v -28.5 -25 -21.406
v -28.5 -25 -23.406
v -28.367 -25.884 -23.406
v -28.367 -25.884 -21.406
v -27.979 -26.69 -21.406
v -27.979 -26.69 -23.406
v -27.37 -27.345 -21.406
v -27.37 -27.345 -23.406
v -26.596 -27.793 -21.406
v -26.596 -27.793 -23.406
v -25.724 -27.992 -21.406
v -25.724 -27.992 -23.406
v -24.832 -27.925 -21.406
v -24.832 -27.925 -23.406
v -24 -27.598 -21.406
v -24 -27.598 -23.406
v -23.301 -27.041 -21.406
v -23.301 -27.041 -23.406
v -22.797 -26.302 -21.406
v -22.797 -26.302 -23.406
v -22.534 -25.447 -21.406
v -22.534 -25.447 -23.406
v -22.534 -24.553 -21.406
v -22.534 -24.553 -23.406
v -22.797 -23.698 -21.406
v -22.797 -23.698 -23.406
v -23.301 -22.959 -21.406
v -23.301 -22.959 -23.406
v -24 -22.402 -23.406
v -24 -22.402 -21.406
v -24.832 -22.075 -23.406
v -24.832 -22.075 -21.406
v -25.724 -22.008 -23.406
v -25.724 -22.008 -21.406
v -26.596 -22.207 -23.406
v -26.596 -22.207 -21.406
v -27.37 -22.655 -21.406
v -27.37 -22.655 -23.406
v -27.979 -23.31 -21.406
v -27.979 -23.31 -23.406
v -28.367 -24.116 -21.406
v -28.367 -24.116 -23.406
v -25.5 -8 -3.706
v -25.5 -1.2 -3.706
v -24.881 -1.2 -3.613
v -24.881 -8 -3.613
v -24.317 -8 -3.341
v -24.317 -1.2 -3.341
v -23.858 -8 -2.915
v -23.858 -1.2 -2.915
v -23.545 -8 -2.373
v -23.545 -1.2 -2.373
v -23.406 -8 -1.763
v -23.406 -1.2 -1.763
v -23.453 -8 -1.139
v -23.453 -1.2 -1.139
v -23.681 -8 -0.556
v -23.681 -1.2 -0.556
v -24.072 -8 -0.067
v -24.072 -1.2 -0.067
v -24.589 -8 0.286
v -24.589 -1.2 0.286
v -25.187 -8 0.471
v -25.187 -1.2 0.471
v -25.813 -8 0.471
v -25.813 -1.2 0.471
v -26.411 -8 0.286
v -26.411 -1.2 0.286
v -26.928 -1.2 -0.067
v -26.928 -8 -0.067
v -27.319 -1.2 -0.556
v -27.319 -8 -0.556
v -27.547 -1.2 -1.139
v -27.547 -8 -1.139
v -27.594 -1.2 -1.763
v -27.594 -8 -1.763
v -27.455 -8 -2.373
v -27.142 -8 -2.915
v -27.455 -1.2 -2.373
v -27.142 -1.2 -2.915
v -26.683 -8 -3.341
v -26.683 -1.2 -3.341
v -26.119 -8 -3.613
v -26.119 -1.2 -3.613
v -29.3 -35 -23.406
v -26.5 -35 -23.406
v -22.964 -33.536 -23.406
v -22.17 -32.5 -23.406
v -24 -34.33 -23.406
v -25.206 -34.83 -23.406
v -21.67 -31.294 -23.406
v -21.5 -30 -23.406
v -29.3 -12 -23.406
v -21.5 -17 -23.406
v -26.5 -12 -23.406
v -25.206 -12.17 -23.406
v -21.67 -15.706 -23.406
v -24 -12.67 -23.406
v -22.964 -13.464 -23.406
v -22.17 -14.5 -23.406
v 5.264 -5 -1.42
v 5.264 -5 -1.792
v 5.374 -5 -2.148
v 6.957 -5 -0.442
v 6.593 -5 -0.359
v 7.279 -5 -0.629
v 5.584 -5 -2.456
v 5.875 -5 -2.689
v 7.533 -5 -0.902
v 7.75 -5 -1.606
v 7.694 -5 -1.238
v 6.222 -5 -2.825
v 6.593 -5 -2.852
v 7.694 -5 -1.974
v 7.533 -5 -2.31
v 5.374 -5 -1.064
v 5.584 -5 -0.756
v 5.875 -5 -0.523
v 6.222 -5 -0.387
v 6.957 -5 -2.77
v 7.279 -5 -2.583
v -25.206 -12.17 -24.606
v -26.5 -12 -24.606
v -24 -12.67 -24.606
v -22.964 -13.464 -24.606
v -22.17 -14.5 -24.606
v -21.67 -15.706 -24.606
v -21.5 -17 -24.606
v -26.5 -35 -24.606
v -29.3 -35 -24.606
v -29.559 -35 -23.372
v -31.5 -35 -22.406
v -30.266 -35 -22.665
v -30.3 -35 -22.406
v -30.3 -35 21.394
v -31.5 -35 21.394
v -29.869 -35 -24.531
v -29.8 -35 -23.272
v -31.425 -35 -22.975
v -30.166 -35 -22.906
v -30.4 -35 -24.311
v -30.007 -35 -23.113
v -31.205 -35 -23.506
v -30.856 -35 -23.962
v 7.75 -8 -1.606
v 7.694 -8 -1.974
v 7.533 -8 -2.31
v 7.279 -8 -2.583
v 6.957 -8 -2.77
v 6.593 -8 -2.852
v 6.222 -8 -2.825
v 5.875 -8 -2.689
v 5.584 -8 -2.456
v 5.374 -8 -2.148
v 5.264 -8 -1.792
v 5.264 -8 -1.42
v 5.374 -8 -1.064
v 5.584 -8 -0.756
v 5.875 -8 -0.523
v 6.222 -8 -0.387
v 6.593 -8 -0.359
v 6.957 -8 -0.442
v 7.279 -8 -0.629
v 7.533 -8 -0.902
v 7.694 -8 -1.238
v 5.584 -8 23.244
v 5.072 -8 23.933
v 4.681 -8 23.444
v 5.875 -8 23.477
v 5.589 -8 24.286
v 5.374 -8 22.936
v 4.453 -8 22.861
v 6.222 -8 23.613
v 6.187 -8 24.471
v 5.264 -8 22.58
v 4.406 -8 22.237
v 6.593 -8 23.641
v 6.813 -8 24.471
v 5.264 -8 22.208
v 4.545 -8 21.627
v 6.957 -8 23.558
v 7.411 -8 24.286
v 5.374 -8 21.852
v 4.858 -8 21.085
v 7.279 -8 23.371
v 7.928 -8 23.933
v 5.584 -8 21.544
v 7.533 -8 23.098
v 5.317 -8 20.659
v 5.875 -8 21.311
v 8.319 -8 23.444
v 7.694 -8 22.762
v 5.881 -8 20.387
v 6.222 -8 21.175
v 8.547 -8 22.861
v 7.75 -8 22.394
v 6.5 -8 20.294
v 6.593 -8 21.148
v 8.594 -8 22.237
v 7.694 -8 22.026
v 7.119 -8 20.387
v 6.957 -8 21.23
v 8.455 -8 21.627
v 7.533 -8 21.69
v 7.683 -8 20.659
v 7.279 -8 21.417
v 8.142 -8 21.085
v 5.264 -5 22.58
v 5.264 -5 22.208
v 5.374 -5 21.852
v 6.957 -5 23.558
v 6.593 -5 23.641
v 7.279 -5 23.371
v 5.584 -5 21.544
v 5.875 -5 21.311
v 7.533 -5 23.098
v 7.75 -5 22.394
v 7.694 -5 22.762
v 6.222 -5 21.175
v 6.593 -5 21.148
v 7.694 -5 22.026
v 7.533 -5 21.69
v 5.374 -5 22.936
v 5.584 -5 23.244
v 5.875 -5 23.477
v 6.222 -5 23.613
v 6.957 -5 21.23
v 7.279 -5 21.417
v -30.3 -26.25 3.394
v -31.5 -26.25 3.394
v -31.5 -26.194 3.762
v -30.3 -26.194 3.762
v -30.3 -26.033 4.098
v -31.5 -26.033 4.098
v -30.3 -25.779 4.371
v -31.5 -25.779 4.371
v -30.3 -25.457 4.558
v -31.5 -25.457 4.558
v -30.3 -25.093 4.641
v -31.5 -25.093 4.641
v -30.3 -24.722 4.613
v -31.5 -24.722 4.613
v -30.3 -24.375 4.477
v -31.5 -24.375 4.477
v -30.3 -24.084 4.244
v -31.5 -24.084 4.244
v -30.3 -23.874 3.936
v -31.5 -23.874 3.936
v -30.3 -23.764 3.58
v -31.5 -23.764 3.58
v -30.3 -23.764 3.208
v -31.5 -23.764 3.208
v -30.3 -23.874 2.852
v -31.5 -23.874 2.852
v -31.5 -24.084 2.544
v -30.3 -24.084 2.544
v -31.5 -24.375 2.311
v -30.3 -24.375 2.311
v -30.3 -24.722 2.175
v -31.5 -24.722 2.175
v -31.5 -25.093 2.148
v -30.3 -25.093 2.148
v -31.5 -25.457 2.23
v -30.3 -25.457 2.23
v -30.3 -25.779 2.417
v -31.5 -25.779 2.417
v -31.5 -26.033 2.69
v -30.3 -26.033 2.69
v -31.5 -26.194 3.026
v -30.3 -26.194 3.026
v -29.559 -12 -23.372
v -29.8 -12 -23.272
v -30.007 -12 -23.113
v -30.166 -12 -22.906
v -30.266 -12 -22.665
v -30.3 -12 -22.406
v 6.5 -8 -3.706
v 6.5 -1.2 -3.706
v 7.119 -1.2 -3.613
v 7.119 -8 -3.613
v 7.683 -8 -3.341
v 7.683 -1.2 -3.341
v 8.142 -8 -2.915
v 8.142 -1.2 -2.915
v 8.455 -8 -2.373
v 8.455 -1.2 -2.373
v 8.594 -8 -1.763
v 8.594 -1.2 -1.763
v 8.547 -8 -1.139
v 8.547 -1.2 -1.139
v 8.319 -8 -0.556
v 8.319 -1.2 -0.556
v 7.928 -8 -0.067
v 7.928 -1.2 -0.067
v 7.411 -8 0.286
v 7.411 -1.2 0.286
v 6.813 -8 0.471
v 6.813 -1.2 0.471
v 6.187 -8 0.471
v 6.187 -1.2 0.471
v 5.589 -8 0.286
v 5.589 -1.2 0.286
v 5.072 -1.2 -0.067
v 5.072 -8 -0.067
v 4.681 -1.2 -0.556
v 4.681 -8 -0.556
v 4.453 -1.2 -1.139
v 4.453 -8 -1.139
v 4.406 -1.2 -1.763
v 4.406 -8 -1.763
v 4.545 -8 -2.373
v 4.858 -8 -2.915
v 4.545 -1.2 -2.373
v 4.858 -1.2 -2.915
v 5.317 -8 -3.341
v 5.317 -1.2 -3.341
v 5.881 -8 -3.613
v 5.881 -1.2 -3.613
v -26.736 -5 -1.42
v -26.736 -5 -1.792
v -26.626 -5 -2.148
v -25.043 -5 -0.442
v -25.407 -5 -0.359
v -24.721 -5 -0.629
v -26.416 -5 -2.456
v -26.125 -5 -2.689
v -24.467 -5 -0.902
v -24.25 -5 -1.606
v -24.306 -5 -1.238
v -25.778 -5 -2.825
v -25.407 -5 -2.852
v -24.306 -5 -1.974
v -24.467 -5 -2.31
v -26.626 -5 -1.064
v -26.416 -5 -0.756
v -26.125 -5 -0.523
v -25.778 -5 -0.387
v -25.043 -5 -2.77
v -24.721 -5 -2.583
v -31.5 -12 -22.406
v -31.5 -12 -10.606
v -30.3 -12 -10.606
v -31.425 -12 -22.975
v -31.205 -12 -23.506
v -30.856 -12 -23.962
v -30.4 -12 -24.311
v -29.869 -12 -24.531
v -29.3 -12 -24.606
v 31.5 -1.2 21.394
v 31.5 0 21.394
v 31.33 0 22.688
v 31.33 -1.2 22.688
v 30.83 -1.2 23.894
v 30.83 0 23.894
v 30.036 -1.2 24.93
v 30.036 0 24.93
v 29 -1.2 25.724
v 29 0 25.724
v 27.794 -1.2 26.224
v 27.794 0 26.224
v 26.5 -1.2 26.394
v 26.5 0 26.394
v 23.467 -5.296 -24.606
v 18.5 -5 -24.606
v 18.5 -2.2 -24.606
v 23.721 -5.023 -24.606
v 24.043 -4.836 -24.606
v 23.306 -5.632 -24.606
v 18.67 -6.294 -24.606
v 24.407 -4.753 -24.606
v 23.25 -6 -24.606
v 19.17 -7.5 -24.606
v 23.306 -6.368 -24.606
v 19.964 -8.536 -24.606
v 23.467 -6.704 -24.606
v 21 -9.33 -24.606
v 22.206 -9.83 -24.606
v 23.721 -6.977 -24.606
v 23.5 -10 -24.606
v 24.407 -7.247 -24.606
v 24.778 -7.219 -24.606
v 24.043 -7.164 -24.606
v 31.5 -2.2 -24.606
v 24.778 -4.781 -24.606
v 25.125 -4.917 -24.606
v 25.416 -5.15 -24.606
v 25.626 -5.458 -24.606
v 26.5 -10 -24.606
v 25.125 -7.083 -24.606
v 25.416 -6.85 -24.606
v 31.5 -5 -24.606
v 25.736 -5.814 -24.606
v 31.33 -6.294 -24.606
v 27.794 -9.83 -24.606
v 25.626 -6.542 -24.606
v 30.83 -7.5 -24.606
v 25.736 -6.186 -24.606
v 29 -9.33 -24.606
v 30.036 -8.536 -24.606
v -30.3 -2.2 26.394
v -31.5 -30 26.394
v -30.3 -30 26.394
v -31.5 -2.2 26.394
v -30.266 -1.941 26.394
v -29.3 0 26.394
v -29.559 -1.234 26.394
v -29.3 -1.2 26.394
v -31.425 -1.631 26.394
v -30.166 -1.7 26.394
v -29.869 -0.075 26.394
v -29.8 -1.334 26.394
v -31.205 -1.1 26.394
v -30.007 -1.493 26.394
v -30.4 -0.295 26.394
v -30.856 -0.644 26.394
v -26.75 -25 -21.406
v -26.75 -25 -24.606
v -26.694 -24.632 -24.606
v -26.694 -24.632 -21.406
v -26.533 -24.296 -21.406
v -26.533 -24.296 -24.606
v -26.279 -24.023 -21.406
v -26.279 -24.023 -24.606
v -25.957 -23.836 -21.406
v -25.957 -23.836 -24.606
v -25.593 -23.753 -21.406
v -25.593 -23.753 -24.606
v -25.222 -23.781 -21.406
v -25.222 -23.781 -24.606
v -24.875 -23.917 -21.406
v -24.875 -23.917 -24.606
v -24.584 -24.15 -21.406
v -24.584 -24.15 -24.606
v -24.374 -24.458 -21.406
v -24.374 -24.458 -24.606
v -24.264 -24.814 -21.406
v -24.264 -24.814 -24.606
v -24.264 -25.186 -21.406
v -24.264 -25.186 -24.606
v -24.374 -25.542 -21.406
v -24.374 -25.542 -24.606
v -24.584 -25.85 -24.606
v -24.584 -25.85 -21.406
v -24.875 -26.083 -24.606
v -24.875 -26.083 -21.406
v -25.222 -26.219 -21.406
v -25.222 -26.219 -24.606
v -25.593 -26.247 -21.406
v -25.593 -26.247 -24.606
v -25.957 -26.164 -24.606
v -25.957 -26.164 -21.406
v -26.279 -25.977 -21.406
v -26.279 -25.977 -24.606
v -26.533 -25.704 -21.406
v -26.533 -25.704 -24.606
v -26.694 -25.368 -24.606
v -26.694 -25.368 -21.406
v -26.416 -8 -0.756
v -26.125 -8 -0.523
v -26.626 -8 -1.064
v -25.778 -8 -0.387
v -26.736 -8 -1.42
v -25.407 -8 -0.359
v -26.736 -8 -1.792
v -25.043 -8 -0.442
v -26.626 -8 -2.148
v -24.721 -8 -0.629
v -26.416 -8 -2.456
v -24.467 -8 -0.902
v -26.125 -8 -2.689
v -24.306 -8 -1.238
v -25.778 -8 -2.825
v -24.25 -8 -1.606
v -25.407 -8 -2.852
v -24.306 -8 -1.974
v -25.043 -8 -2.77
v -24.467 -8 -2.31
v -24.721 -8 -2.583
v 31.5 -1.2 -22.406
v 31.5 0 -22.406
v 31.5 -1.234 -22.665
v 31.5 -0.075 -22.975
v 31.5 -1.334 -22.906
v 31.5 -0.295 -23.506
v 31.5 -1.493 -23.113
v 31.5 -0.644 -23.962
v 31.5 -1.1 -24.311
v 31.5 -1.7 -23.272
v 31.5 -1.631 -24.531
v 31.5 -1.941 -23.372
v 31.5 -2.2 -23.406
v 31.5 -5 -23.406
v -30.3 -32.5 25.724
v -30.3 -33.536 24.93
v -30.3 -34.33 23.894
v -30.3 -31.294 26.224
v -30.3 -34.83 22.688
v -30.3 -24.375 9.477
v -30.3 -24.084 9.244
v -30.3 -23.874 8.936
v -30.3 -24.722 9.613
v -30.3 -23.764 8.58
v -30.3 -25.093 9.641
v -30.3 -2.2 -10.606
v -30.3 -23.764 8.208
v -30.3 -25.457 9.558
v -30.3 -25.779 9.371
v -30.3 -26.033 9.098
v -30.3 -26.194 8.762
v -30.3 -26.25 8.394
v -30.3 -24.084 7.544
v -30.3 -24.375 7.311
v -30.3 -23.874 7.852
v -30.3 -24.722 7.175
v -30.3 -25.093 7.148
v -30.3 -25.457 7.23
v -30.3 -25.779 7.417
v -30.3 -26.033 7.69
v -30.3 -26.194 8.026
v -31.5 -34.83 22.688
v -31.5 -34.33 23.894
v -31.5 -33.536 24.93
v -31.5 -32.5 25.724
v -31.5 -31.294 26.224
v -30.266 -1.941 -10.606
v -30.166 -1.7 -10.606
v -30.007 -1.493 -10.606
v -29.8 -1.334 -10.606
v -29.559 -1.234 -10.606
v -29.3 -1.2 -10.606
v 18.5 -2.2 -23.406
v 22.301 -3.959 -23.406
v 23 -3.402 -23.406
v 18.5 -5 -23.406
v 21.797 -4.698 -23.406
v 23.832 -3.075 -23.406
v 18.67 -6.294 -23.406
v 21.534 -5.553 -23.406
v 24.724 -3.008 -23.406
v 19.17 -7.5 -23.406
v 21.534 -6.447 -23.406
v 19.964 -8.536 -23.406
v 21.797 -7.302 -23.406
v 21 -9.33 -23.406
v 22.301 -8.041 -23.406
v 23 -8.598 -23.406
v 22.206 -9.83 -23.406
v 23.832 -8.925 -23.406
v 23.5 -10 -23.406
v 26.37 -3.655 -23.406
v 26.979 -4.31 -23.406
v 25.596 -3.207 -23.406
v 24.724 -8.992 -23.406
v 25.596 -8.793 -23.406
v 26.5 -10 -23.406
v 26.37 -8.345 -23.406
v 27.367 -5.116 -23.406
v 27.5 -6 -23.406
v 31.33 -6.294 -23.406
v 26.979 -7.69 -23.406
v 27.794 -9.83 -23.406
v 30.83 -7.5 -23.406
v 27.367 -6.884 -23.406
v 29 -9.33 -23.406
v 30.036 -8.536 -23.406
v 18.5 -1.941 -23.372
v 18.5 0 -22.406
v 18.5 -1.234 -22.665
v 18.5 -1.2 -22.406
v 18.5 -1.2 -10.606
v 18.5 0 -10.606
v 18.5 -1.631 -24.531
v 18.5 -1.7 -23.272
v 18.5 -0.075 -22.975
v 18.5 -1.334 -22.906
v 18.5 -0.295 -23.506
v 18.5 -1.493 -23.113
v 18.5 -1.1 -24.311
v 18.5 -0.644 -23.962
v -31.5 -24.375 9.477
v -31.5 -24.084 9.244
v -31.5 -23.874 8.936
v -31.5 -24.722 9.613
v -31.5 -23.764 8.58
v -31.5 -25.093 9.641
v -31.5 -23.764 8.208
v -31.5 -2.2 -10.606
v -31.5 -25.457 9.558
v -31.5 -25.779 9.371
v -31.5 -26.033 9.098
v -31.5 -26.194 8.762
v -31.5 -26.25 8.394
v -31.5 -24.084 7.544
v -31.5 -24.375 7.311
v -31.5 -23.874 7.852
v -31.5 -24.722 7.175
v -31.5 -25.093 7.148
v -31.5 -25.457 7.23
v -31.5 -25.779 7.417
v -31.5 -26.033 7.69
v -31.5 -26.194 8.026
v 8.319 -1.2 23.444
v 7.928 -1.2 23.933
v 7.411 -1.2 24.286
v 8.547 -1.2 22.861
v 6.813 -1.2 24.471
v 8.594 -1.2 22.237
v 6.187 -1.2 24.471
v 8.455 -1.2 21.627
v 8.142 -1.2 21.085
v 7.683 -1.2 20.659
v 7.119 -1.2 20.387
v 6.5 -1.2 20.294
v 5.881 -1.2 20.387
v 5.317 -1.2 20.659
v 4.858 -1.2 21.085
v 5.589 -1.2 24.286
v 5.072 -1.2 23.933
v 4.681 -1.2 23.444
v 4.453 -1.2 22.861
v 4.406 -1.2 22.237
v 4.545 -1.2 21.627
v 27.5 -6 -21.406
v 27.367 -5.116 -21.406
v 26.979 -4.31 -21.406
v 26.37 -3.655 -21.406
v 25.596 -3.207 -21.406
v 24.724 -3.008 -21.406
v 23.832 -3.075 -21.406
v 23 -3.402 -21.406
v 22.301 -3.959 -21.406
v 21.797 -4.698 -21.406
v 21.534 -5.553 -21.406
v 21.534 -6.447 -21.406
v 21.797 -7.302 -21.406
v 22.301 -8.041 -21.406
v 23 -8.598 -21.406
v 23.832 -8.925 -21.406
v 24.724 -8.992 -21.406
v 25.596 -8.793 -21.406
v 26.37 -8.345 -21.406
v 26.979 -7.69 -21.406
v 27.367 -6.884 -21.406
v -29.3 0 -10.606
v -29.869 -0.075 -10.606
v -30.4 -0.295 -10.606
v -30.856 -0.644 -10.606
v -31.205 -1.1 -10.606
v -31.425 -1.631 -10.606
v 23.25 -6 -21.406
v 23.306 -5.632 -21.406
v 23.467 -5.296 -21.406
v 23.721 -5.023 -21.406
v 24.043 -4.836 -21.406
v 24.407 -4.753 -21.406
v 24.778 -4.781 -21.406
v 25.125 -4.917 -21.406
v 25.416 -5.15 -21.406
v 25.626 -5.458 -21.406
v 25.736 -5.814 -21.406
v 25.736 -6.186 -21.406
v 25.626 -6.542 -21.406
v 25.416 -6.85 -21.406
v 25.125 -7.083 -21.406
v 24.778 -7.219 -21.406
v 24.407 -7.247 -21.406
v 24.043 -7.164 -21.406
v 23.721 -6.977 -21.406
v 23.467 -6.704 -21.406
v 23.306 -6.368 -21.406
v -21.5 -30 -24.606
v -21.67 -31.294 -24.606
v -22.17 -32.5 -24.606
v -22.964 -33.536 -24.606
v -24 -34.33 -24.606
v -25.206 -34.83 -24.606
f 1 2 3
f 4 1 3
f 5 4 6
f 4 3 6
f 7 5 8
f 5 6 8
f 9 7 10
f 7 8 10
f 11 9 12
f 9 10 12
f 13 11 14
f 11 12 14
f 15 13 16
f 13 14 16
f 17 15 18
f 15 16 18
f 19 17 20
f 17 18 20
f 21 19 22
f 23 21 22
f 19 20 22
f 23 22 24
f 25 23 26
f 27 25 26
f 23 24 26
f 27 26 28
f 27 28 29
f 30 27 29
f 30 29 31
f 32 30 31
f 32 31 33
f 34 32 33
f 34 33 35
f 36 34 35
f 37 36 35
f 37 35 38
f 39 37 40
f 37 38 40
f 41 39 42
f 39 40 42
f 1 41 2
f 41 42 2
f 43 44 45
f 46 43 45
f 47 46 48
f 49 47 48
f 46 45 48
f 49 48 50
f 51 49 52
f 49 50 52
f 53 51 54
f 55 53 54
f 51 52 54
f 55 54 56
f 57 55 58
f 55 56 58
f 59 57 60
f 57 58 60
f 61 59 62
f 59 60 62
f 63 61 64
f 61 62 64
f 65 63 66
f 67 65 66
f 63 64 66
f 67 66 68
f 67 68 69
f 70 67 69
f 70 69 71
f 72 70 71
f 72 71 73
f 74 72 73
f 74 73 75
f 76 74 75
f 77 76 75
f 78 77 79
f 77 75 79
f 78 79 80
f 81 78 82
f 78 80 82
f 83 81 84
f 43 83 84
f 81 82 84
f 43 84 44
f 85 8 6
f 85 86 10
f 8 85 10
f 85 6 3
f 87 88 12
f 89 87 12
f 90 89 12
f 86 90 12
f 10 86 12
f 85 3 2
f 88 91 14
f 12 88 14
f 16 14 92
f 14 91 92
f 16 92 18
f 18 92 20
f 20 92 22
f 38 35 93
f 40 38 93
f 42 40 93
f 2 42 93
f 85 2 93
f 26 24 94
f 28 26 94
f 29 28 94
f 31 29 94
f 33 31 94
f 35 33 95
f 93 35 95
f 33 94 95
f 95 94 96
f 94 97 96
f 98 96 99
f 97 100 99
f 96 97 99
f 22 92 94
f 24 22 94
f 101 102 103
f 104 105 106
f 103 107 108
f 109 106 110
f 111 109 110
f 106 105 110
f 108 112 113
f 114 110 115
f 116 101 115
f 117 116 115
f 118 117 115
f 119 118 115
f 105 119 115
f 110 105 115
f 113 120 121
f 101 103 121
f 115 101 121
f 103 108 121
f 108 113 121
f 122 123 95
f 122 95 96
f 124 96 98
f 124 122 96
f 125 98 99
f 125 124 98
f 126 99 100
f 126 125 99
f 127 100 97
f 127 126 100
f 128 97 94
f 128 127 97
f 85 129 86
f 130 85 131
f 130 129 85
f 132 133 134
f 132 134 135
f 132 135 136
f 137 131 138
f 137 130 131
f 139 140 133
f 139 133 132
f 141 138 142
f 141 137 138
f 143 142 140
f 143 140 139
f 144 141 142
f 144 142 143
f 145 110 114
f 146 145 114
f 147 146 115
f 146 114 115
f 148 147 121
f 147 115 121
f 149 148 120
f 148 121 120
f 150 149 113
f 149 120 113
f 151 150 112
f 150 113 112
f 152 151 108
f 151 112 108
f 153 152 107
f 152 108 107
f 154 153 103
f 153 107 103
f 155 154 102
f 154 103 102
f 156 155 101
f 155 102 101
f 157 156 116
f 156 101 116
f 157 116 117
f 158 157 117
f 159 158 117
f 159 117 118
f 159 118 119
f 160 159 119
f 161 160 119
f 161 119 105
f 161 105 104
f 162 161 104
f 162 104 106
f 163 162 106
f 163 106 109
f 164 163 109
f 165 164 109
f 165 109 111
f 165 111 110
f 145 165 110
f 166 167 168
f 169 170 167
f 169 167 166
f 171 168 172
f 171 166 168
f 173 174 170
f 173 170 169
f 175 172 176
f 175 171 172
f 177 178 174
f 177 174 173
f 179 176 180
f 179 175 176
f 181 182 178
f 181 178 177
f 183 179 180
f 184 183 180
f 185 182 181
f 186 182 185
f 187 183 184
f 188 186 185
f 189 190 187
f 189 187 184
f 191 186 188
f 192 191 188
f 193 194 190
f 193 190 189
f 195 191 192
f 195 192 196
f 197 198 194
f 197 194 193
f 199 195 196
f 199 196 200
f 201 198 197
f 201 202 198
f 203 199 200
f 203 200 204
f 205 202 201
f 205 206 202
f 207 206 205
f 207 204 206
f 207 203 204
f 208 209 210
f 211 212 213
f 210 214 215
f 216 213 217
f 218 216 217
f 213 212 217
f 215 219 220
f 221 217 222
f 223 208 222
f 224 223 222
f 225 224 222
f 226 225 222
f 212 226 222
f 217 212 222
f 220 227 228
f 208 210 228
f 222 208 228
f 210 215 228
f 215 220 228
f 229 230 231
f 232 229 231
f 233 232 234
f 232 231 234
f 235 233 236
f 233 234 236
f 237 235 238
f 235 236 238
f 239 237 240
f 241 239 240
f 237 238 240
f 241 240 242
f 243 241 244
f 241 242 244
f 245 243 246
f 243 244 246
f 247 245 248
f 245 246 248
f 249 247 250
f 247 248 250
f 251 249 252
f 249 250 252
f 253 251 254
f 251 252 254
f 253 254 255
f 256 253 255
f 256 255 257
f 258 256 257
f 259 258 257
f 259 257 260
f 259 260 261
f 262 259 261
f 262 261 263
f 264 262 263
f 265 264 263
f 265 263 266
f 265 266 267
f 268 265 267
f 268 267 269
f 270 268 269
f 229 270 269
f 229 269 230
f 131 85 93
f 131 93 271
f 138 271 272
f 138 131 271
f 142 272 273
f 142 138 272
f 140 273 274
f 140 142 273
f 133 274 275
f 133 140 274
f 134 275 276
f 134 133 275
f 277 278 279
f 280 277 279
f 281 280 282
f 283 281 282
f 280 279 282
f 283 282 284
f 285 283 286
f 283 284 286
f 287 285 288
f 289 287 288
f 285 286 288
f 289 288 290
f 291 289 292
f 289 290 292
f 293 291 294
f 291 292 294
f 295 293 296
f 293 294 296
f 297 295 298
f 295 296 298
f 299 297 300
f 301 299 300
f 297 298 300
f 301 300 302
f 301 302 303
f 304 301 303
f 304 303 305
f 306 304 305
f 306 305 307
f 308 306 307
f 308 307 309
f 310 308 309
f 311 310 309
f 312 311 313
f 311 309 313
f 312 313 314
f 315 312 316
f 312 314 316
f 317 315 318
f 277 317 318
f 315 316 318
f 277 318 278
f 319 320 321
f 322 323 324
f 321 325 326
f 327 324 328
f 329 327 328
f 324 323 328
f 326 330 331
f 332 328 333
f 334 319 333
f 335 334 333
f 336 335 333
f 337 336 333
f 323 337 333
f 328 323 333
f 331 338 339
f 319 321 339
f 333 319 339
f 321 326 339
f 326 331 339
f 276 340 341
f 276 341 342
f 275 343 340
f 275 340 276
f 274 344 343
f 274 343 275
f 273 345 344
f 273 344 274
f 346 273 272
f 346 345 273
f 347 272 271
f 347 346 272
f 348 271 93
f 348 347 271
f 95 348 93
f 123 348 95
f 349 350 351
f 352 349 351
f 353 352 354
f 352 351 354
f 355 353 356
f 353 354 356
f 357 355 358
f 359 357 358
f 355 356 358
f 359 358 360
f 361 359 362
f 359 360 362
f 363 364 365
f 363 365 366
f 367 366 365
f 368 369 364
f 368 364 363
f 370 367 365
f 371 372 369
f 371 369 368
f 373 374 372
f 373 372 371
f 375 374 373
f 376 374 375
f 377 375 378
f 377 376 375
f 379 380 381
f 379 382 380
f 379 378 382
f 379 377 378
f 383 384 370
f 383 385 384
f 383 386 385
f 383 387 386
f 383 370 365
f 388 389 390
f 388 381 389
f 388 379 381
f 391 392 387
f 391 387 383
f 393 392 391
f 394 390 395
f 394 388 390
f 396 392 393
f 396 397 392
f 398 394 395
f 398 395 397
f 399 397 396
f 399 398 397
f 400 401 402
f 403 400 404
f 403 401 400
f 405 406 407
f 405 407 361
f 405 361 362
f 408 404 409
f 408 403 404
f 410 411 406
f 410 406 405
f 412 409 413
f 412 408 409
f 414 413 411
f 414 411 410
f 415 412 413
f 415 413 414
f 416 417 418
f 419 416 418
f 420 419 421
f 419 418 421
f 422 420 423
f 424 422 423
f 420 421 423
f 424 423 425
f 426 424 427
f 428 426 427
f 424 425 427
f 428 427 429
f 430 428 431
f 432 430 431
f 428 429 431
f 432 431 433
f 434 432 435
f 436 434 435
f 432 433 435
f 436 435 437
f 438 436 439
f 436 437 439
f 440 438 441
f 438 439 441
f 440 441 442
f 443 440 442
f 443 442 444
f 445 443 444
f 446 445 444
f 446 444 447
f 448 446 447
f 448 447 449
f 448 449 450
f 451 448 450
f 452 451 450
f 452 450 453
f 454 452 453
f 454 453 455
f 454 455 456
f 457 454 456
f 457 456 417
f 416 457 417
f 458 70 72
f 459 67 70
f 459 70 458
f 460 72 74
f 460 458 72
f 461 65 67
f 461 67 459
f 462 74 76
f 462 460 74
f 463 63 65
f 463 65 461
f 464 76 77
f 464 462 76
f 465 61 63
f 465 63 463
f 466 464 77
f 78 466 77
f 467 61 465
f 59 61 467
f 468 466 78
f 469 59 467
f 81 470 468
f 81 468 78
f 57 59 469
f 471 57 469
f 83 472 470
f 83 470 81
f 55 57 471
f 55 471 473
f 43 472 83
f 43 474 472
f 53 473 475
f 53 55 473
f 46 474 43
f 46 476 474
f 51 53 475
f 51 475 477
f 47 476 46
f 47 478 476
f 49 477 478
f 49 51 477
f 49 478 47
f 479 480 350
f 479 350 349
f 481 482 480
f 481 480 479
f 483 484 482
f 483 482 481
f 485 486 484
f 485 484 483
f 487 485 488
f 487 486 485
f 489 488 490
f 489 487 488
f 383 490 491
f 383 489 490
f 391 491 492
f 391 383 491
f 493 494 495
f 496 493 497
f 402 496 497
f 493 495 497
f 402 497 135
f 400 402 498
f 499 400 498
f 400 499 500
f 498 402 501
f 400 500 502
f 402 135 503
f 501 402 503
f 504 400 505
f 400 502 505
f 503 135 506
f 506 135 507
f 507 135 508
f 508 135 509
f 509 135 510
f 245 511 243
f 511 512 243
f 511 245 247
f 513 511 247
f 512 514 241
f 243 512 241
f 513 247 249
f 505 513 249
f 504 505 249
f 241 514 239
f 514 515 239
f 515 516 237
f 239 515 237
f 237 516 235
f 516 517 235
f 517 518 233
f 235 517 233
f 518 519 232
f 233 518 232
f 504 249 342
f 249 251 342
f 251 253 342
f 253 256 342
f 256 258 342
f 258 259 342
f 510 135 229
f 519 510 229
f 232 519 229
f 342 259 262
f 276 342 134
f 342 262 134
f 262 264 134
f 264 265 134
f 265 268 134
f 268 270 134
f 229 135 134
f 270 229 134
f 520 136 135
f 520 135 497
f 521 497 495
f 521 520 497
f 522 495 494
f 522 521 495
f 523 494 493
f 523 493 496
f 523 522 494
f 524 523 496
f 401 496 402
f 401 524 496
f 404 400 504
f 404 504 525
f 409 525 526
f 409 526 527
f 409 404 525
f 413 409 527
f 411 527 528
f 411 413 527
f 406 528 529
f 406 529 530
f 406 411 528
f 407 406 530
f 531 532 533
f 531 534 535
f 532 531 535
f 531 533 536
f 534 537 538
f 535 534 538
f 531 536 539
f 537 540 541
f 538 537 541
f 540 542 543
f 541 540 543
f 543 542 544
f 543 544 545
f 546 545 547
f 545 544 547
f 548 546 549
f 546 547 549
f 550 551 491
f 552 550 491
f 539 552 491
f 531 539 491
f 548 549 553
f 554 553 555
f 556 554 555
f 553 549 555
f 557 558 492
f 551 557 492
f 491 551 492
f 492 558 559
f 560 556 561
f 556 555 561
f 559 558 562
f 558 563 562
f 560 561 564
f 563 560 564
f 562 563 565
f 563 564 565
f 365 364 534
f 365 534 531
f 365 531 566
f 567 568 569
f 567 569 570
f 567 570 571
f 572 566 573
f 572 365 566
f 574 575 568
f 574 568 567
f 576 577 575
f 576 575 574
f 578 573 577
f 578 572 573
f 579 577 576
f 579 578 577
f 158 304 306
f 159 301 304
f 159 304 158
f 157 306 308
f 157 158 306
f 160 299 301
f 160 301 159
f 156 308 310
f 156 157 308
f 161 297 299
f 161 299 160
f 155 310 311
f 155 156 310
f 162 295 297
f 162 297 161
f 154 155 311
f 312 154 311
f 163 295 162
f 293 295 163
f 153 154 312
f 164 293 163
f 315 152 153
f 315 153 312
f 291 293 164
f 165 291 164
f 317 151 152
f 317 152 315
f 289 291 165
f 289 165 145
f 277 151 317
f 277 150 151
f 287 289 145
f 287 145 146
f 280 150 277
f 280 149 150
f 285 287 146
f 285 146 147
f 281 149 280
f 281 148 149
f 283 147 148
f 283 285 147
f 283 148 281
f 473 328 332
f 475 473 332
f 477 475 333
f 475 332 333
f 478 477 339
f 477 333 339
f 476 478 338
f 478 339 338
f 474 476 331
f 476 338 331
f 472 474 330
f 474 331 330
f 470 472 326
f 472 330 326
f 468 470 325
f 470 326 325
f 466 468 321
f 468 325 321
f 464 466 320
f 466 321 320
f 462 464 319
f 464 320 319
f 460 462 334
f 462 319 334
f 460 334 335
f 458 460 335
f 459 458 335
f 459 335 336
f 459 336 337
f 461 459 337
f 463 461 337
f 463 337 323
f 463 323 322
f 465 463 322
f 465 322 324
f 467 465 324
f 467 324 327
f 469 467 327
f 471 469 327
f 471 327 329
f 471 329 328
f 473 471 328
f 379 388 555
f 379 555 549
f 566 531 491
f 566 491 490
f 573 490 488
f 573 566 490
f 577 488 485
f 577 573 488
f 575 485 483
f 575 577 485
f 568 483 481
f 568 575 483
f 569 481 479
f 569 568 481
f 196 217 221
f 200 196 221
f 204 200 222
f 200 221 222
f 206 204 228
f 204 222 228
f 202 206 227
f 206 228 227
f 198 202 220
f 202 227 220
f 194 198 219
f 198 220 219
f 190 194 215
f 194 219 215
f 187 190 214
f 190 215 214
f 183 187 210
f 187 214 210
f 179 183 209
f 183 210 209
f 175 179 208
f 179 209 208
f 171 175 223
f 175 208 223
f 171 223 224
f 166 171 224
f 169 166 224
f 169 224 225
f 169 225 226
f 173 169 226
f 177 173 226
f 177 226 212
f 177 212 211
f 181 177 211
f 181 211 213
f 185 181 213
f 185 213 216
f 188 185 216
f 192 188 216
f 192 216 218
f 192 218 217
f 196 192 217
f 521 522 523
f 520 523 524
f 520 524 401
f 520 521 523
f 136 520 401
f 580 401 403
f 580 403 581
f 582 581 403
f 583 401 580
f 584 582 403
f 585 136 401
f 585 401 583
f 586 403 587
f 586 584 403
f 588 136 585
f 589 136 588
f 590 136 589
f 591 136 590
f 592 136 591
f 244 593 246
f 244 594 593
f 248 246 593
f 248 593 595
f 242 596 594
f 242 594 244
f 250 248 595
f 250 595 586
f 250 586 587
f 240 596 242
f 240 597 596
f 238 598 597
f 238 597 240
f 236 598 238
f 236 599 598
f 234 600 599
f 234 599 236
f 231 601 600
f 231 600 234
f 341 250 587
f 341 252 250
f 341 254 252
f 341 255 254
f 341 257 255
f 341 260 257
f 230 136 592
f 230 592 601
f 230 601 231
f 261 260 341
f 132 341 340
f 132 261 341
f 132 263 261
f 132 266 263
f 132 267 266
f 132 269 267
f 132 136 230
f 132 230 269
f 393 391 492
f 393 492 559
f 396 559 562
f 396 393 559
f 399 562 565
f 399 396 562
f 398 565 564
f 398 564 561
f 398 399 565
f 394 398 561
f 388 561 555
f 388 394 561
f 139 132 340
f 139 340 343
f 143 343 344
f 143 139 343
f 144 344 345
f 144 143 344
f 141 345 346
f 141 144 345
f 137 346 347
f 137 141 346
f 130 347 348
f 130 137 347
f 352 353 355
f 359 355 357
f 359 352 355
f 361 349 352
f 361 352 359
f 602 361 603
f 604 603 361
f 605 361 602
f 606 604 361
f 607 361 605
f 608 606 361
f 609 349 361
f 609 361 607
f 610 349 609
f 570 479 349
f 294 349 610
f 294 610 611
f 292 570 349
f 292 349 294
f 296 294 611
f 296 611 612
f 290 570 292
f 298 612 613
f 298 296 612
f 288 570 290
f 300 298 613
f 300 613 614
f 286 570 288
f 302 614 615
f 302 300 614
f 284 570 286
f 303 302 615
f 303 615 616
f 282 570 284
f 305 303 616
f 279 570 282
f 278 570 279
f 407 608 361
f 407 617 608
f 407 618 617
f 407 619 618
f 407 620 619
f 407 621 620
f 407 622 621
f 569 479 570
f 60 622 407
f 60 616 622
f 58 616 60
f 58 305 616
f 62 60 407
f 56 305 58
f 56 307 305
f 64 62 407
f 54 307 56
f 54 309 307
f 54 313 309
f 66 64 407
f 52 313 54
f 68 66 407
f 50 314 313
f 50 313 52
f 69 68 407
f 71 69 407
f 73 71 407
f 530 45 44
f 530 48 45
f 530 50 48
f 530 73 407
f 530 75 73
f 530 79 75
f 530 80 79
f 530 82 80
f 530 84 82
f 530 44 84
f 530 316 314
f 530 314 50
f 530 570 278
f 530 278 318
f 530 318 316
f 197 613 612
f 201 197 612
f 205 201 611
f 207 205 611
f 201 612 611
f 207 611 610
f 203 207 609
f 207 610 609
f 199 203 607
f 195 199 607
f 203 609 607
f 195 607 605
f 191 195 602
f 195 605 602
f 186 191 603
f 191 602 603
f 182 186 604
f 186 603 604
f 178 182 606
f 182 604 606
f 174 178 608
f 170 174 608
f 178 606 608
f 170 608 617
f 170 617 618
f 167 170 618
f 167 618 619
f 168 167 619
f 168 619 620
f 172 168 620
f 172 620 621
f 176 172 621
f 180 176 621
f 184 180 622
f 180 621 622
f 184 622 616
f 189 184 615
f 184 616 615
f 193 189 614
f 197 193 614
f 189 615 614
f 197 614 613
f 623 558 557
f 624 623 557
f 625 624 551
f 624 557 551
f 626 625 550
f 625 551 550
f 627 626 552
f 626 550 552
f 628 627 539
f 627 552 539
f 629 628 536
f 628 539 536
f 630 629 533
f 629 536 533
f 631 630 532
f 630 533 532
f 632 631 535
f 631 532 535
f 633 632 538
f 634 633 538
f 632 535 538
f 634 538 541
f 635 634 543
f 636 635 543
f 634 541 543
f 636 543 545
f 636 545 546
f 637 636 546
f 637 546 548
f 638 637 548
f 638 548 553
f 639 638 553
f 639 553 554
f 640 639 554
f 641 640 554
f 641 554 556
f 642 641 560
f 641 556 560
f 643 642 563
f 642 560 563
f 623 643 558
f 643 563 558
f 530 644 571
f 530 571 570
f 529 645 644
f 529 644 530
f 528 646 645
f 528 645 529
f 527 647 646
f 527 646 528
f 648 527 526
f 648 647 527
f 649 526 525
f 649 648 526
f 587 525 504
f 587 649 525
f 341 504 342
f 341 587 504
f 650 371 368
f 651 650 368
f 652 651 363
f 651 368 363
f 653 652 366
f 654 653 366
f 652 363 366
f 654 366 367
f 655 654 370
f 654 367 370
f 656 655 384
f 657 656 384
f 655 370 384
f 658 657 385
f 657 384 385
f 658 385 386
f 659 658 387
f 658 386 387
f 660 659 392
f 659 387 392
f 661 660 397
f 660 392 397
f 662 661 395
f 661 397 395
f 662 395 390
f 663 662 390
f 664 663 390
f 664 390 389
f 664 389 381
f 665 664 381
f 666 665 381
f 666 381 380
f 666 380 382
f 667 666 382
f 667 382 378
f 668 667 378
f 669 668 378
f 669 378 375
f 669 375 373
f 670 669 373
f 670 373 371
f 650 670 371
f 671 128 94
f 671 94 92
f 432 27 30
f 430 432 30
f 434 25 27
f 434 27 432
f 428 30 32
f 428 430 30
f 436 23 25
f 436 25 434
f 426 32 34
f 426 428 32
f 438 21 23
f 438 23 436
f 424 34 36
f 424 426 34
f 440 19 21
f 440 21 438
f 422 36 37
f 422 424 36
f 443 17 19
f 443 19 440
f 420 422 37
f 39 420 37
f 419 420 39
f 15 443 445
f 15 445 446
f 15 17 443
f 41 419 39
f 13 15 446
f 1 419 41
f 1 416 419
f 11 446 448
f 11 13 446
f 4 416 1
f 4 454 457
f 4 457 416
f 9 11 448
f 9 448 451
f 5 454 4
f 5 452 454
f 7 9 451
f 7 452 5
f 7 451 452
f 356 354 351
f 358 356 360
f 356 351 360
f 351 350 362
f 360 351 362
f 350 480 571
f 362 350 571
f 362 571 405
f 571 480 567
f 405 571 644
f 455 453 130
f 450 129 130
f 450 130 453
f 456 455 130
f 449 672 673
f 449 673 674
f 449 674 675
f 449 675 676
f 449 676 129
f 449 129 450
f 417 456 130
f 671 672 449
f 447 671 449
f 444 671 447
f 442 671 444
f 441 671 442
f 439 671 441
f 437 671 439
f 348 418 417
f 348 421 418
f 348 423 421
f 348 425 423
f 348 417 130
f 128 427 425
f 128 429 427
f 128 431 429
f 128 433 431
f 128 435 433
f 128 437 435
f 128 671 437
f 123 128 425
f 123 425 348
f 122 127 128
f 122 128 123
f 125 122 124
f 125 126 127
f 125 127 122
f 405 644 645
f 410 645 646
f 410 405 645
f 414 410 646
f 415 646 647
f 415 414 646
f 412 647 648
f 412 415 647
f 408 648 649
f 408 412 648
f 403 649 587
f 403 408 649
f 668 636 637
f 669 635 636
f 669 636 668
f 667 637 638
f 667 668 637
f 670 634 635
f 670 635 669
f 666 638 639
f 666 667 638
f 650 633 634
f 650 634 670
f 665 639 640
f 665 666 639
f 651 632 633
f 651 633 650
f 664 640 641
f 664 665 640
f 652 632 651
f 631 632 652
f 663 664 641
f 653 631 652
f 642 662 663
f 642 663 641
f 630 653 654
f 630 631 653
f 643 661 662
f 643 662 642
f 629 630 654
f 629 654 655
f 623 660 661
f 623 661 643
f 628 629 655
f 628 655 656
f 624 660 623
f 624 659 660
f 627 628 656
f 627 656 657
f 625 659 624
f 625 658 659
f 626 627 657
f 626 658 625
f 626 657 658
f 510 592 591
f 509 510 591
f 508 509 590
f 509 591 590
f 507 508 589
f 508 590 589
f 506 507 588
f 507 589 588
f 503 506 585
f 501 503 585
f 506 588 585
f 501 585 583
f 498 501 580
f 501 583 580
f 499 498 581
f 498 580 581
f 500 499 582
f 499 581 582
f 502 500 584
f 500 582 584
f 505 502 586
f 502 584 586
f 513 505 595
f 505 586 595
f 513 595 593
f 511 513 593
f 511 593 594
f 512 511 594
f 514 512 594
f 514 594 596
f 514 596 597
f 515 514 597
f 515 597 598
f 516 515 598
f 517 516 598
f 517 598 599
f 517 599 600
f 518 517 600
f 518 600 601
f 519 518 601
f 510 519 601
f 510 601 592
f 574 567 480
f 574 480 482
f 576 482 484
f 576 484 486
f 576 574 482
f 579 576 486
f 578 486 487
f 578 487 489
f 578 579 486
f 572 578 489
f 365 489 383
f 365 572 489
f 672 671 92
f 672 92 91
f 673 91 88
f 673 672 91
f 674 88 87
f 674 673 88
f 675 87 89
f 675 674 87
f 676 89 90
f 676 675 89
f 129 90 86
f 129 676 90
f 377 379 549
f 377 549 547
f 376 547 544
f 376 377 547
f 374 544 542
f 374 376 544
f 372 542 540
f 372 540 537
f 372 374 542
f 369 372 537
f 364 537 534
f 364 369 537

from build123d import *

# Parameters (mm, degrees)
SM_BASE_FLANGE_1_DEPTH           = 1.2
SKETCH_9_R                       = 2.1
EXTRUDE_1_DEPTH                  = 6.8
HOLE_WIZARD_M3_1_D               = 2.5
HOLE_WIZARD_M3_1_DEPTH           = 3
SM_EDGE_FLANGE_1_STRIP_W         = 6.8
SM_EDGE_FLANGE_1_STRIP_H         = 1.2
SM_EDGE_FLANGE_1_STRIP_CUT_DEPTH = 13
SM_EDGE_FLANGE_1_DEPTH           = 13
SM_EDGE_FLANGE_1_FLAT_DEPTH      = 1.2
SKETCH_15_R                      = 3
EXTRUDE_2_DEPTH                  = 2
HOLE_WIZARD_M3_2_D               = 2.5
SM_EDGE_FLANGE_4_STRIP_W         = 6.8
SM_EDGE_FLANGE_4_STRIP_H         = 1.2
SM_EDGE_FLANGE_4_STRIP_CUT_DEPTH = 37
SM_EDGE_FLANGE_4_DEPTH           = 37
SM_EDGE_FLANGE_4_FLAT_DEPTH      = 1.2
SM_EDGE_FLANGE_5_STRIP_W         = 6.8
SM_EDGE_FLANGE_5_STRIP_H         = 1.2
SM_EDGE_FLANGE_5_STRIP_CUT_DEPTH = 23
SM_EDGE_FLANGE_5_DEPTH           = 23
SM_EDGE_FLANGE_5_FLAT_DEPTH      = 1.2
SKETCH_26_R                      = 3
EXTRUDE_3_DEPTH                  = 2
HOLE_WIZARD_M3_3_D               = 2.5
CUT_EXTRUDE_1_REACH              = 78.751
SKETCH_29_R                      = 1.25


# Sheet-metal steps are written as plain solids
with BuildPart() as part:
    # Sketch 1 → 基体-法兰1 (new body)
    with BuildSketch(Plane(origin=(0, 0, 0), x_dir=(1, 0, 0), z_dir=(0, 1, 0))):
        with BuildLine():
            Line((18.5, 24.605976874), (31.5, 24.605976874))
            Line((31.5, 24.605976874), (31.5, -21.394023126))
            ThreePointArc((31.5, -21.394023126), (30.035533906, -24.929557032), (26.5, -26.394023126))
            Line((26.5, -26.394023126), (-31.5, -26.394023126))
            Line((-31.5, -26.394023126), (-31.5, 10.605976874))
            Line((-31.5, 10.605976874), (18.5, 10.605976874))
            Line((18.5, 10.605976874), (18.5, 24.605976874))
        make_face()
    extrude(amount=-SM_BASE_FLANGE_1_DEPTH)

    # 草图9 → 凸台-拉伸1 (add)
    with BuildSketch(Plane.XZ.offset(1.2)):
        with Locations(Location((-25.5, -1.605976874, 0), (0, 0, 270))):
            Circle(SKETCH_9_R)
        with Locations(Location((6.5, 22.394023126, 0), (0, 0, 270))):
            Circle(SKETCH_9_R)
        with Locations(Location((6.5, -1.605976874, 0), (0, 0, 270))):
            Circle(SKETCH_9_R)
    extrude(amount=EXTRUDE_1_DEPTH)

    # M3 螺纹孔1
    with Locations(Plane(origin=(0, -8, 0), x_dir=(-1, 0, 0), z_dir=(0, -1, 0))):
        with Locations((-6.5, 1.605976874), (25.5, 1.605976874), (-6.5, -22.394023126)):
            Hole(HOLE_WIZARD_M3_1_D / 2, depth=HOLE_WIZARD_M3_1_DEPTH)

    # 边线-法兰1 strip (across the edge) → 边线-法兰1 strip cut (cut)
    with BuildSketch(Plane(origin=(18.5, -1.2, -24.605976874), x_dir=(0, 0, 1), z_dir=(1, 0, 0))):
        with Locations((-1.2, -0.6)):
            Rectangle(SM_EDGE_FLANGE_1_STRIP_W, SM_EDGE_FLANGE_1_STRIP_H)
    extrude(amount=SM_EDGE_FLANGE_1_STRIP_CUT_DEPTH, mode=Mode.SUBTRACT)

    # 边线-法兰1 bend section (across the edge) → 边线-法兰1 (add)
    with BuildSketch(Plane(origin=(18.5, -1.2, -24.605976874), x_dir=(0, 0, 1), z_dir=(1, 0, 0))):
        with BuildLine():
            Line((0, 1), (1.2, 1))
            ThreePointArc((1.2, 1), (1.492893219, 0.292893219), (2.2, 0))
            Line((2.2, 0), (2.2, -1.2))
            ThreePointArc((2.2, -1.2), (0.644365081, -0.555634919), (0, 1))
        make_face()
    extrude(amount=SM_EDGE_FLANGE_1_DEPTH)

    # 边线-法兰1 profile (on flange) → 边线-法兰1 flat (add)
    with BuildSketch(Plane(origin=(0, -1.2, -24.605976874), x_dir=(1, 0, 0), z_dir=(0, 0, -1))):
        with BuildLine():
            Line((31.5, 1), (31.5, 3.8))
            ThreePointArc((31.5, 3.8), (30.035533906, 7.335533906), (26.5, 8.8))
            Line((26.5, 8.8), (23.5, 8.8))
            ThreePointArc((23.5, 8.8), (19.964466094, 7.335533906), (18.5, 3.8))
            Line((18.5, 3.8), (18.5, 1))
            Line((18.5, 1), (31.5, 1))
        make_face()
    extrude(amount=-SM_EDGE_FLANGE_1_FLAT_DEPTH)

    # 草图15 → 凸台-拉伸2 (add)
    with BuildSketch(Plane.XY.offset(-23.405976874)):
        with Locations((24.5, -6)):
            Circle(SKETCH_15_R)
    extrude(amount=EXTRUDE_2_DEPTH)

    # M3 螺纹孔2 (through all)
    with Locations(Plane.XY.offset(-21.405976874)):
        with Locations((24.5, -6)):
            Hole(HOLE_WIZARD_M3_2_D / 2)

    # 边线-法兰4 strip (across the edge) → 边线-法兰4 strip cut (cut)
    with BuildSketch(Plane(origin=(-31.5, -1.2, 26.394023126), x_dir=(1, 0, 0), z_dir=(0, 0, -1))):
        with Locations((-1.2, -0.6)):
            Rectangle(SM_EDGE_FLANGE_4_STRIP_W, SM_EDGE_FLANGE_4_STRIP_H)
    extrude(amount=SM_EDGE_FLANGE_4_STRIP_CUT_DEPTH, mode=Mode.SUBTRACT)

    # 边线-法兰4 bend section (across the edge) → 边线-法兰4 (add)
    with BuildSketch(Plane(origin=(-31.5, -1.2, 26.394023126), x_dir=(1, 0, 0), z_dir=(0, 0, -1))):
        with BuildLine():
            Line((0, 1), (1.2, 1))
            ThreePointArc((1.2, 1), (1.492893219, 0.292893219), (2.2, 0))
            Line((2.2, 0), (2.2, -1.2))
            ThreePointArc((2.2, -1.2), (0.644365081, -0.555634919), (0, 1))
        make_face()
    extrude(amount=SM_EDGE_FLANGE_4_DEPTH)

    # 边线-法兰4 profile (on flange) → 边线-法兰4 flat (add)
    with BuildSketch(Plane(origin=(-31.5, -1.2, 0), x_dir=(0, 0, -1), z_dir=(-1, 0, 0))):
        with BuildLine():
            Line((-26.394023126, 1), (10.605976874, 1))
            Line((10.605976874, 1), (10.605976874, 10.8))
            Line((10.605976874, 10.8), (24.605976874, 10.8))
            Line((24.605976874, 10.8), (24.605976874, 33.8))
            Line((24.605976874, 33.8), (-21.394023126, 33.8))
            ThreePointArc((-21.394023126, 33.8), (-24.929557032, 32.335533906), (-26.394023126, 28.8))
            Line((-26.394023126, 28.8), (-26.394023126, 1))
        make_face()
    extrude(amount=-SM_EDGE_FLANGE_4_FLAT_DEPTH)

    # 边线-法兰5 strip (across the edge) → 边线-法兰5 strip cut (cut)
    with BuildSketch(Plane(origin=(-30.3, -35, -24.605976874), x_dir=(0, 0, 1), z_dir=(0, 1, 0))):
        with Locations((-1.2, -0.6)):
            Rectangle(SM_EDGE_FLANGE_5_STRIP_W, SM_EDGE_FLANGE_5_STRIP_H)
    extrude(amount=SM_EDGE_FLANGE_5_STRIP_CUT_DEPTH, mode=Mode.SUBTRACT)

    # 边线-法兰5 bend section (across the edge) → 边线-法兰5 (add)
    with BuildSketch(Plane(origin=(-30.3, -35, -24.605976874), x_dir=(0, 0, 1), z_dir=(0, 1, 0))):
        with BuildLine():
            Line((0, 1), (1.2, 1))
            ThreePointArc((1.2, 1), (1.492893219, 0.292893219), (2.2, 0))
            Line((2.2, 0), (2.2, -1.2))
            ThreePointArc((2.2, -1.2), (0.644365081, -0.555634919), (0, 1))
        make_face()
    extrude(amount=SM_EDGE_FLANGE_5_DEPTH)

    # 边线-法兰5 profile (on flange) → 边线-法兰5 flat (add)
    with BuildSketch(Plane(origin=(-30.3, 0, -24.605976874), x_dir=(0, 1, 0), z_dir=(0, 0, -1))):
        with BuildLine():
            ThreePointArc((-12, 3.8), (-13.464466094, 7.335533906), (-17, 8.8))
            Line((-17, 8.8), (-30, 8.8))
            ThreePointArc((-30, 8.8), (-33.535533906, 7.335533906), (-35, 3.8))
            Line((-35, 3.8), (-35, 1))
            Line((-35, 1), (-12, 1))
            Line((-12, 1), (-12, 3.8))
        make_face()
    extrude(amount=-SM_EDGE_FLANGE_5_FLAT_DEPTH)

    # 草图26 → 凸台-拉伸3 (add)
    with BuildSketch(Plane.XY.offset(-23.405976874)):
        with Locations(Location((-25.5, -25, 0), (0, 0, 180))):
            Circle(SKETCH_26_R)
    extrude(amount=EXTRUDE_3_DEPTH)

    # M3 螺纹孔3 (through all)
    with Locations(Plane.XY.offset(-21.405976874)):
        with Locations((-25.5, -25)):
            Hole(HOLE_WIZARD_M3_3_D / 2)

    # 草图29 → 切除-拉伸1 (cut, up to next)
    with BuildSketch(Plane.ZY.offset(31.5), mode=Mode.PRIVATE) as cut_extrude_1_sk1:
        with Locations(Location((3.394023126, -25, 0), (0, 0, 270))):
            Circle(SKETCH_29_R)
    cut_extrude_1_tool1 = extrude(cut_extrude_1_sk1.sketch, amount=-CUT_EXTRUDE_1_REACH, mode=Mode.PRIVATE) & part.part
    # 草图29 → 切除-拉伸1 (cut, up to next)
    with BuildSketch(Plane.ZY.offset(31.5), mode=Mode.PRIVATE) as cut_extrude_1_sk2:
        with Locations(Location((8.394023126, -25, 0), (0, 0, 270))):
            Circle(SKETCH_29_R)
    cut_extrude_1_tool2 = extrude(cut_extrude_1_sk2.sketch, amount=-CUT_EXTRUDE_1_REACH, mode=Mode.PRIVATE) & part.part
    add(cut_extrude_1_tool1.solids().sort_by_distance((-31.5, -25, 3.394023))[0], mode=Mode.SUBTRACT)
    add(cut_extrude_1_tool2.solids().sort_by_distance((-31.5, -25, 8.394023))[0], mode=Mode.SUBTRACT)


solid = part.part
